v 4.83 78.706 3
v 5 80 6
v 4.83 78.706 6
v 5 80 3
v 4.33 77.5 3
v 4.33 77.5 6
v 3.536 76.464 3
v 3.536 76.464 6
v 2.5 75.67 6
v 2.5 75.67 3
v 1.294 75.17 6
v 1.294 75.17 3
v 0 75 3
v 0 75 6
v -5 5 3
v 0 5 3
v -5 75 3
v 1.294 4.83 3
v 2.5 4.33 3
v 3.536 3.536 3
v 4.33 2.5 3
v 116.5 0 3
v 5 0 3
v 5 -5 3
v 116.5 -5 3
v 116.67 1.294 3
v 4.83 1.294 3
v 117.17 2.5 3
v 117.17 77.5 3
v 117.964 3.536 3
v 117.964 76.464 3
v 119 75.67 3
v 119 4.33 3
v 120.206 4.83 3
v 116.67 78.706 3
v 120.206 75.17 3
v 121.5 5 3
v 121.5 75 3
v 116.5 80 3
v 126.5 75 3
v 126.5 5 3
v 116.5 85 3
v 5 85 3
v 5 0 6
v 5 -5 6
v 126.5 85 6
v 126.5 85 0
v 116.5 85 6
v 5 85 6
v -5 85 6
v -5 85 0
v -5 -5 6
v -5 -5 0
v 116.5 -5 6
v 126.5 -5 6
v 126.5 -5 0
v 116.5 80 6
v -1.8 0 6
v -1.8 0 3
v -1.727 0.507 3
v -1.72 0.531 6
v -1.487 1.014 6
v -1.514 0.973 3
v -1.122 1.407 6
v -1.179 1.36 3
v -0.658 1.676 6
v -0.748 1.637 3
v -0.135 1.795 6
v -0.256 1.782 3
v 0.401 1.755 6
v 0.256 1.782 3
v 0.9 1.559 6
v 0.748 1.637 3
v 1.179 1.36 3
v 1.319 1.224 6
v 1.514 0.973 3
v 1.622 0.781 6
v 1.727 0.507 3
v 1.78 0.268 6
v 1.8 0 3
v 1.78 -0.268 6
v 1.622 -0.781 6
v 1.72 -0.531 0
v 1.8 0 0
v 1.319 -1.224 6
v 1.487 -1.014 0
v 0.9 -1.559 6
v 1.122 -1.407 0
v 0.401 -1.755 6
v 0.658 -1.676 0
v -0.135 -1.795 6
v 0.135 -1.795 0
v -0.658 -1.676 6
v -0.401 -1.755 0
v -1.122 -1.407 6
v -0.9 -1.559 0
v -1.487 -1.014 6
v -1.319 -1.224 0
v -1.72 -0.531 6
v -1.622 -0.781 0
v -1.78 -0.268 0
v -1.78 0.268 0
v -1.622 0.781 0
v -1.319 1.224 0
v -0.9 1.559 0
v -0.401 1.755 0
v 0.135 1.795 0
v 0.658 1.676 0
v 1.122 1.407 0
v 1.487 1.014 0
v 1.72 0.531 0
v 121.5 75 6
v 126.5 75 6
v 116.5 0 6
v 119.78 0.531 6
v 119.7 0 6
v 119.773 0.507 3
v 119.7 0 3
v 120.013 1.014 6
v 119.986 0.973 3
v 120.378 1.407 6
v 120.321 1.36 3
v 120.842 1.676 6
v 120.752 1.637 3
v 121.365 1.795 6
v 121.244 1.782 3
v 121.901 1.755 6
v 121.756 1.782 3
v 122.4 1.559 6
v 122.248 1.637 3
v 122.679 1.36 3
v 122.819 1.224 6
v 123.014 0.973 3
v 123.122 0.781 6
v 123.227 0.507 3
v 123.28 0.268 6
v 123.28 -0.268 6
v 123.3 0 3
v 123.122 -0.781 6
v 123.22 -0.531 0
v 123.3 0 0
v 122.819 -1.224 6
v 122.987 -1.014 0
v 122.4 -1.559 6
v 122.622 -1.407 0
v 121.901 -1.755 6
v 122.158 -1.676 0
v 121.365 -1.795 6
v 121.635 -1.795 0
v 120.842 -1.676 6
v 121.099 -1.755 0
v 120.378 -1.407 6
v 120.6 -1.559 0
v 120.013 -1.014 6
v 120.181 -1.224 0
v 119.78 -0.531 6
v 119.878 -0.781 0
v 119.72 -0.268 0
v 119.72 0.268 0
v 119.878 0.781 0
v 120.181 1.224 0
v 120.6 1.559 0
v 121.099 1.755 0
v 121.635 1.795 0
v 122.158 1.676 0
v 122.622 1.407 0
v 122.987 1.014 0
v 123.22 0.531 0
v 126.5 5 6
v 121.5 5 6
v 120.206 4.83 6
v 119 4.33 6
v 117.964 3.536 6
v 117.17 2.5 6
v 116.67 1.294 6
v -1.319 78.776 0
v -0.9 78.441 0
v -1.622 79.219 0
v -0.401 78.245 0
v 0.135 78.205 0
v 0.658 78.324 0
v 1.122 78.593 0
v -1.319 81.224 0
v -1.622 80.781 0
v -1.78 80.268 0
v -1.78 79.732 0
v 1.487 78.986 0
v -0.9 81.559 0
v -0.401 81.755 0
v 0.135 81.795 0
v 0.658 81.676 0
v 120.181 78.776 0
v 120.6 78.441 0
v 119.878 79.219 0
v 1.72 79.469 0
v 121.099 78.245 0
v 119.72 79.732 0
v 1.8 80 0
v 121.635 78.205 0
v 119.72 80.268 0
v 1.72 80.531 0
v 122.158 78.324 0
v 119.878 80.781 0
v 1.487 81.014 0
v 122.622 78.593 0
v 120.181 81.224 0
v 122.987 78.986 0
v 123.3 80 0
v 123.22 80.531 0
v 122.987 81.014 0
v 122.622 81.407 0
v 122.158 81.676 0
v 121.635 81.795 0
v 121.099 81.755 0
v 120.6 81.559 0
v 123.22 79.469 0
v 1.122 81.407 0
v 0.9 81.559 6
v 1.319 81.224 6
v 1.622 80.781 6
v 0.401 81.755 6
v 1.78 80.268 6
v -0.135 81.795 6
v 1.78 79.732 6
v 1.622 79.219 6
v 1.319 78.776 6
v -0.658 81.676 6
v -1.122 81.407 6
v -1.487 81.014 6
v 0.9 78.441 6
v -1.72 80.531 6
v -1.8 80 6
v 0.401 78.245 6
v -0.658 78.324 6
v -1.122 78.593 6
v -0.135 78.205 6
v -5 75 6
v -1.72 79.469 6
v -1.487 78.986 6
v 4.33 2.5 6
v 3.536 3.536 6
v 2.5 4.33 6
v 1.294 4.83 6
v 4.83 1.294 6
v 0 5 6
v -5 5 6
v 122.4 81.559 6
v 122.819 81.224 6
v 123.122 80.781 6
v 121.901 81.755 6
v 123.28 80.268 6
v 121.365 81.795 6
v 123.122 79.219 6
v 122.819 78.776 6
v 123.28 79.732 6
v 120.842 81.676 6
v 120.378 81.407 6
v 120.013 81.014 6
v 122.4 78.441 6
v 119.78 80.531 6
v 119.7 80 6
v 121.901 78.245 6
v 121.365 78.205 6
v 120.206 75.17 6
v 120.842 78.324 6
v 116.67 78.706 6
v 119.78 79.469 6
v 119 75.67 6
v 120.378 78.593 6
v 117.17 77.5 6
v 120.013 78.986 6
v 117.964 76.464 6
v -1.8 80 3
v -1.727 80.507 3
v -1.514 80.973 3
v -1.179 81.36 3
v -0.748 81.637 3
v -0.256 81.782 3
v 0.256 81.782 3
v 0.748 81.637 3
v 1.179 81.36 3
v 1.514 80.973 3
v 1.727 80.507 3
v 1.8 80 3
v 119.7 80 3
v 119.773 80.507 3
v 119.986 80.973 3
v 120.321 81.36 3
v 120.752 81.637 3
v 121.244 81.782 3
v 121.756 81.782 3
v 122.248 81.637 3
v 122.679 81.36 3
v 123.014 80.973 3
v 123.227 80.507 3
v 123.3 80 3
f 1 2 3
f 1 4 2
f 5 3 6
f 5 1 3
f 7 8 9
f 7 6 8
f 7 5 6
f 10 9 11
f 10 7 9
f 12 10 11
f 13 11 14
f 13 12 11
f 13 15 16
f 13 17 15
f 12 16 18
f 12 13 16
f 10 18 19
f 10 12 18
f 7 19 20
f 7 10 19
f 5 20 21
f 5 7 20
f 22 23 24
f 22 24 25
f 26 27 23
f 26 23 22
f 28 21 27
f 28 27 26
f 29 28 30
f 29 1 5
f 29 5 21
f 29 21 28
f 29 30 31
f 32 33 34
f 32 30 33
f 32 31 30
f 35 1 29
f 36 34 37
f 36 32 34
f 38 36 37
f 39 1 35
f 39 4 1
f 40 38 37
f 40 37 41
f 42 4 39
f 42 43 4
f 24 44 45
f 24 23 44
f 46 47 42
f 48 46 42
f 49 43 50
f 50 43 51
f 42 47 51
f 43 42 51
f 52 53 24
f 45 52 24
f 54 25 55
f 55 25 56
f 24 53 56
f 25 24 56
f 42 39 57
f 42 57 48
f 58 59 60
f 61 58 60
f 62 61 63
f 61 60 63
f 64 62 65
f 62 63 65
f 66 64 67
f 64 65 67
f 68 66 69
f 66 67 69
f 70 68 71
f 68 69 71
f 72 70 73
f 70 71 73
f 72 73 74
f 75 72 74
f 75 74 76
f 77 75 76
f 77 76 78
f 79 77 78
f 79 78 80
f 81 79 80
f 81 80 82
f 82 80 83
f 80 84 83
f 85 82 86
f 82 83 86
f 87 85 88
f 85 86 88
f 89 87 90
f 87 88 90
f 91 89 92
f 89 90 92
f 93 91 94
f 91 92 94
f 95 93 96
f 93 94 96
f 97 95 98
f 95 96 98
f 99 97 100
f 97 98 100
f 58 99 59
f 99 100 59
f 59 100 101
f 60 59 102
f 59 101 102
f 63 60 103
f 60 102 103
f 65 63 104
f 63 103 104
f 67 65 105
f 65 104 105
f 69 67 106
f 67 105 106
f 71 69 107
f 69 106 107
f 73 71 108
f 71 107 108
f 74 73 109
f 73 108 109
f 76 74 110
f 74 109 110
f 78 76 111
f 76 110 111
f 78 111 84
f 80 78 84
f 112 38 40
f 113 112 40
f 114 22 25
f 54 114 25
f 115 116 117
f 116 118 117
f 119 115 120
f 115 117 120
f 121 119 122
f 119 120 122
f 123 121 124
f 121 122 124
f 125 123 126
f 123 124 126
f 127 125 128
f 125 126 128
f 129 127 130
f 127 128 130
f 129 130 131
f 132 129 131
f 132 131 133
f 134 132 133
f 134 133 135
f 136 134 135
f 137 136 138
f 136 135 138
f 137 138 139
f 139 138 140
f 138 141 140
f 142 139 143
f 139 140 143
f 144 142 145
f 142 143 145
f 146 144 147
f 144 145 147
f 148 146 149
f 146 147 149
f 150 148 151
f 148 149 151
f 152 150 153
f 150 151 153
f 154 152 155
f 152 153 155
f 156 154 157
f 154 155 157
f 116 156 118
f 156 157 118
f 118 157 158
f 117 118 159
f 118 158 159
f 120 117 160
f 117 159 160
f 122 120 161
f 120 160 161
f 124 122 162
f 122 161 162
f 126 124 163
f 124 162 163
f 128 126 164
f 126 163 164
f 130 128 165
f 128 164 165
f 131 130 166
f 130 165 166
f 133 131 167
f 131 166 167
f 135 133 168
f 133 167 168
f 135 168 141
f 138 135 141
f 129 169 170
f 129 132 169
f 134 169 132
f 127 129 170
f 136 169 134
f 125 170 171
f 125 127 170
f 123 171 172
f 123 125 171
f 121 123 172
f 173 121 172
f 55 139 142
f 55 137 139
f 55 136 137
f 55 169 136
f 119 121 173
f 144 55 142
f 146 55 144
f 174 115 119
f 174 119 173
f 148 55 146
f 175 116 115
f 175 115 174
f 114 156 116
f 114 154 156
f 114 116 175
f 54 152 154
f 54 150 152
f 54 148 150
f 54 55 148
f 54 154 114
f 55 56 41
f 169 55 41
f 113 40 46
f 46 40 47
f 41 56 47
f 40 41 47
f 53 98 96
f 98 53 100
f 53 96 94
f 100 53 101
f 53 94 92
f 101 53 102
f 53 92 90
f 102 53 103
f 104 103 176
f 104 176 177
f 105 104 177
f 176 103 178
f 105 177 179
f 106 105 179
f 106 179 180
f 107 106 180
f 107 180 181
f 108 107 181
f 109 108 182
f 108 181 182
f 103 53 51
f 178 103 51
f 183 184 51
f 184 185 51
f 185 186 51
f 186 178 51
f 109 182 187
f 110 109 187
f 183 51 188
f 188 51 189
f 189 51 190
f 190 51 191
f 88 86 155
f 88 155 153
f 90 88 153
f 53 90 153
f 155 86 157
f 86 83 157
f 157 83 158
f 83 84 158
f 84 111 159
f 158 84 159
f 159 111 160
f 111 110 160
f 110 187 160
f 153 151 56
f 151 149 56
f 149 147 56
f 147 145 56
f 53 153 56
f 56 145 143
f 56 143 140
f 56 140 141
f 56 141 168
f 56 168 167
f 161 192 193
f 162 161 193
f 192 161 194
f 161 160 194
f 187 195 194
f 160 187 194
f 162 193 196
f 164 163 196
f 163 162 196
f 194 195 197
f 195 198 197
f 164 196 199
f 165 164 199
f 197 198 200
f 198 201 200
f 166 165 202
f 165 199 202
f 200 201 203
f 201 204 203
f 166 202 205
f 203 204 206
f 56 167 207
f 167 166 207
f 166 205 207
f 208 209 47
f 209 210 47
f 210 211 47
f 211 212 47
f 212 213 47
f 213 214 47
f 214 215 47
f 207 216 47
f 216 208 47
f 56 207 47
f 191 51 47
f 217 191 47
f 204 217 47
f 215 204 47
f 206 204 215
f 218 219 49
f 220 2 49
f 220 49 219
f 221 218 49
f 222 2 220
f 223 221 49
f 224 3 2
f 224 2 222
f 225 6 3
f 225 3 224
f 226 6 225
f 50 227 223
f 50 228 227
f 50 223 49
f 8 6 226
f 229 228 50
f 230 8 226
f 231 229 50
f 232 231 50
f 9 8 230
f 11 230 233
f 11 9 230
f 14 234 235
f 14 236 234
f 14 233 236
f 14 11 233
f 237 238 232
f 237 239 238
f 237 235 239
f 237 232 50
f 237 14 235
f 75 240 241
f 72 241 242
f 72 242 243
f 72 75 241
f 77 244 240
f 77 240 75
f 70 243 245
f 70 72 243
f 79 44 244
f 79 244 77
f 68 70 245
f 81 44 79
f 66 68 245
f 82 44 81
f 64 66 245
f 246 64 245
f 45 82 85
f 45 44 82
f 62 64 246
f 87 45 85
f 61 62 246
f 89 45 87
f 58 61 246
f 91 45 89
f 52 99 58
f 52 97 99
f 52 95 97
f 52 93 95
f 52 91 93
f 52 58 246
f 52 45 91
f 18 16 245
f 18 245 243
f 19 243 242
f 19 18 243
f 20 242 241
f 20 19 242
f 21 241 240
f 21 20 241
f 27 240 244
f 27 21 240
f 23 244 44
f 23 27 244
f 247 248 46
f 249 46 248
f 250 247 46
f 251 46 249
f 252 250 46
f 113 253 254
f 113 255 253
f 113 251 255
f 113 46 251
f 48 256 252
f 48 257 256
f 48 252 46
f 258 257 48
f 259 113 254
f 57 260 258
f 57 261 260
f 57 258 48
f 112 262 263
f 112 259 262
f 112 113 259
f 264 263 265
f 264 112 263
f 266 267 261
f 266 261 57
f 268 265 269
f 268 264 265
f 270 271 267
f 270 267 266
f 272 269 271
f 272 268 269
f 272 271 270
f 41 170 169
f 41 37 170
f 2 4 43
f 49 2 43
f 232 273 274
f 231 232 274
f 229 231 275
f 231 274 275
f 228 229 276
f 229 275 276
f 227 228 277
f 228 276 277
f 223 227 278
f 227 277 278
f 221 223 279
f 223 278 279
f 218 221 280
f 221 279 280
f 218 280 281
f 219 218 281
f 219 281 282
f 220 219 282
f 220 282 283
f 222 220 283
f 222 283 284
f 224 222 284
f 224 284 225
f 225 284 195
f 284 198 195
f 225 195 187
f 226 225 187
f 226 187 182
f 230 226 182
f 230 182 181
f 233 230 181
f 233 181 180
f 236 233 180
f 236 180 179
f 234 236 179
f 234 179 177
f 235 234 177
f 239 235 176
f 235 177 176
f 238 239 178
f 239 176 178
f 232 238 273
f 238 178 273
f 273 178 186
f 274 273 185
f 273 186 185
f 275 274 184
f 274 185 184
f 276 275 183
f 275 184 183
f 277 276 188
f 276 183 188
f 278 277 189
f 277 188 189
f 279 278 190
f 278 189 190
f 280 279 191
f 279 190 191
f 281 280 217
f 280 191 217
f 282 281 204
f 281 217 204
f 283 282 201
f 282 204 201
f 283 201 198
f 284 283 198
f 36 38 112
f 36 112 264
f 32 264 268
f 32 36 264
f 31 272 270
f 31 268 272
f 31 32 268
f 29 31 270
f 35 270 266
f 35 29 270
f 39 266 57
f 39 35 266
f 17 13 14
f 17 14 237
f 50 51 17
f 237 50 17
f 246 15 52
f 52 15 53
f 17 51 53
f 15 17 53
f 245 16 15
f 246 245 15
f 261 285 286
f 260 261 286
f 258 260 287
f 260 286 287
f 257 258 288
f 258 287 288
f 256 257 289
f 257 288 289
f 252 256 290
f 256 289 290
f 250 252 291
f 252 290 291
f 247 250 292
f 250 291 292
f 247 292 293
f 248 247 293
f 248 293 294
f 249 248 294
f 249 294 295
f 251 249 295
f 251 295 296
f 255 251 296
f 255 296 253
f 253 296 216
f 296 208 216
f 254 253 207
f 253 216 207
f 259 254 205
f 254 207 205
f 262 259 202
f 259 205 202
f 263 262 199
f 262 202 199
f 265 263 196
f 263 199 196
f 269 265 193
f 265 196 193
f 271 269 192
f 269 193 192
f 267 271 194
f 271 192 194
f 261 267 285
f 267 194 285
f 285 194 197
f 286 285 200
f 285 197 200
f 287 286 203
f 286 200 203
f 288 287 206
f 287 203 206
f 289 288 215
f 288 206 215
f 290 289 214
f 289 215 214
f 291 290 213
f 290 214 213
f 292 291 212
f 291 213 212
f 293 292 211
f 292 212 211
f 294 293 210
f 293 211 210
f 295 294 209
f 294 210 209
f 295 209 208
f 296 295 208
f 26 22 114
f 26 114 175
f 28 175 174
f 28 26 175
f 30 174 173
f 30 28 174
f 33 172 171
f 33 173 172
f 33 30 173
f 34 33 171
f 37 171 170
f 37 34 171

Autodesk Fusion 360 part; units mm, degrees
sketch "Sketch1" plane through (0, 0, 0) normal (0, 0, 1) x (1, 0, 0)
  circle A0 centre (0, 0) radius 1.8
  circle A1 centre (121.5, 0) radius 1.8
  circle A2 centre (0, 80) radius 1.8
  circle A3 centre (121.5, 80) radius 1.8
  line L0 (-5, -5) -> (126.5, -5)
  line L1 (126.5, -5) -> (126.5, 85)
  line L2 (126.5, 85) -> (-5, 85)
  line L3 (-5, 85) -> (-5, -5)
  dimension "d3" = 121.5
  dimension "d4" = 80
  dimension "d5" = 3.6
  dimension "d6" = 5
  dimension "d7" = 5
  dimension "d8" = 5
  dimension "d9" = 5
extrude "Extrude1" add sketch "Sketch1" along normal blind 3
sketch "Sketch2" plane through (0, 0, 3) normal (0, 0, 1) x (-1, 0, 0)
  circle A0 centre (0, 0) radius 1.8
  circle A1 centre (0, -80) radius 1.8
  circle A2 centre (-121.5, 0) radius 1.8
  circle A3 centre (-121.5, -80) radius 1.8
  line L0 (5, -85) -> (5, 5)
  line L1 (5, 5) -> (-126.5, 5)
  line L2 (-126.5, 5) -> (-126.5, -85)
  line L3 (-126.5, -85) -> (5, -85)
  circle A4 centre (0, 0) radius 5
  line L4 (-5, 0) -> (-5, 5)
  line L5 (0, -5) -> (5, -5)
  circle A5 centre (-121.5, 0) radius 5
  line L6 (-116.5, 0) -> (-116.5, 5)
  line L7 (-121.5, -5) -> (-126.5, -5)
  circle A6 centre (-121.5, -80) radius 5
  line L8 (-116.5, -80) -> (-116.5, -85)
  line L9 (-121.5, -75) -> (-126.5, -75)
  circle A7 centre (0, -80) radius 5
  line L10 (-5, -80) -> (-5, -85)
  line L11 (0, -75) -> (5, -75)
extrude "Extrude2" add sketch "Sketch2" along normal blind 3 contours L0 L3 A7 | L0 A7 L11 | A7 | L3 A7 L10 | L0 A4 L5 | L3 A6 L8 | L0 L1 A4 | A4 | L2 L3 A6 | A6 | L1 A4 L4 | L2 A6 L9 | L1 A5 L6 | L2 A5 L7 | L1 L2 A5 | A5
equation "d7 = d6"
equation "d8 = d6"
equation "d9 = d6"
